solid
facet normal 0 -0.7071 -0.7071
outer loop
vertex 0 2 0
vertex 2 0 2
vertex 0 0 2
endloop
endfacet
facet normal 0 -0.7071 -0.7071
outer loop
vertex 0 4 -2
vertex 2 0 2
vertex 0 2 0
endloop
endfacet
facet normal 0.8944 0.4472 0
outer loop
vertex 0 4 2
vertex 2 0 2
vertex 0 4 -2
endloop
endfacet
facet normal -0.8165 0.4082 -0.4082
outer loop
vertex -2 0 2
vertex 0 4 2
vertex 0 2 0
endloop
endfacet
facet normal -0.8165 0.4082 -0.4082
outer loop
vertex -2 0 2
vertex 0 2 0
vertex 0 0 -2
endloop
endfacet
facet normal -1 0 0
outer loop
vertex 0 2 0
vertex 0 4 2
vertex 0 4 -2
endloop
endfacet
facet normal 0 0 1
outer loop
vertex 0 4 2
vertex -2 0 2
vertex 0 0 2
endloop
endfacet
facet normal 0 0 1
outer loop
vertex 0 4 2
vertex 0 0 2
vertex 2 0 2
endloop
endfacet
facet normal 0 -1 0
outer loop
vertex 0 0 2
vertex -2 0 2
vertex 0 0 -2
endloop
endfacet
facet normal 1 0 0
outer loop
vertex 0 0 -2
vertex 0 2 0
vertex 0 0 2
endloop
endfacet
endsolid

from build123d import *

# Parameters (mm, degrees)
SKETCH1_W           = 4
SKETCH1_H           = 4
BOSS_EXTRUDE1_DEPTH = 4
CUT_EXTRUDE1_DEPTH  = 2
CUT_EXTRUDE2_DEPTH  = 2
CUT_EXTRUDE3_DEPTH  = 10
CUT_EXTRUDE4_DEPTH  = 10


with BuildPart() as part:
    # Sketch1 → Boss-Extrude1 (new body)
    with BuildSketch(Plane(origin=(0, 0, 0), x_dir=(1, 0, 0), z_dir=(0, 1, 0))):
        Rectangle(SKETCH1_W, SKETCH1_H)
    extrude(amount=BOSS_EXTRUDE1_DEPTH)

    # Sketch2 → Cut-Extrude1 (cut)
    with BuildSketch(Plane.ZY.offset(2)):
        Polygon((2, 4), (-2, 0), (-2, 4), align=None)
    extrude(amount=-CUT_EXTRUDE1_DEPTH, mode=Mode.SUBTRACT)

    # Sketch3 → Cut-Extrude2 (cut)
    with BuildSketch(Plane(origin=(2, 0, 0), x_dir=(0, 0, -1), z_dir=(1, 0, 0))):
        Polygon((-2, 0), (2, 4), (2, 0), align=None)
    extrude(amount=-CUT_EXTRUDE2_DEPTH, mode=Mode.SUBTRACT)

    # Sketch4 → Cut-Extrude3 (cut)
    with BuildSketch(Plane.XY.offset(2)):
        Polygon((2, 0), (0, 4), (2, 4), align=None)
    extrude(amount=-CUT_EXTRUDE3_DEPTH, mode=Mode.SUBTRACT)

    # 3DSketch1 → Cut-Extrude4 (cut, along a direction that is not the sketch's normal)
    with BuildSketch(Plane(origin=(0, 0, -2), x_dir=(0, 0.7071067811865476, 0.7071067811865476), z_dir=(0.816496580927726, -0.408248290463863, 0.408248290463863))):
        Polygon((0, 0), (2.828427125, 3.464101615), (5.656854249, 0), align=None)
    extrude(amount=-CUT_EXTRUDE4_DEPTH, dir=(0, 0, 1), mode=Mode.SUBTRACT)


with BuildPart() as body_2:
    # of the pieces the cut leaves, the one that is kept (cut_extrude4_keep)
    add(part.part.solids().sort_by_distance((0, 0, 2))[0])


solid = body_2.part
